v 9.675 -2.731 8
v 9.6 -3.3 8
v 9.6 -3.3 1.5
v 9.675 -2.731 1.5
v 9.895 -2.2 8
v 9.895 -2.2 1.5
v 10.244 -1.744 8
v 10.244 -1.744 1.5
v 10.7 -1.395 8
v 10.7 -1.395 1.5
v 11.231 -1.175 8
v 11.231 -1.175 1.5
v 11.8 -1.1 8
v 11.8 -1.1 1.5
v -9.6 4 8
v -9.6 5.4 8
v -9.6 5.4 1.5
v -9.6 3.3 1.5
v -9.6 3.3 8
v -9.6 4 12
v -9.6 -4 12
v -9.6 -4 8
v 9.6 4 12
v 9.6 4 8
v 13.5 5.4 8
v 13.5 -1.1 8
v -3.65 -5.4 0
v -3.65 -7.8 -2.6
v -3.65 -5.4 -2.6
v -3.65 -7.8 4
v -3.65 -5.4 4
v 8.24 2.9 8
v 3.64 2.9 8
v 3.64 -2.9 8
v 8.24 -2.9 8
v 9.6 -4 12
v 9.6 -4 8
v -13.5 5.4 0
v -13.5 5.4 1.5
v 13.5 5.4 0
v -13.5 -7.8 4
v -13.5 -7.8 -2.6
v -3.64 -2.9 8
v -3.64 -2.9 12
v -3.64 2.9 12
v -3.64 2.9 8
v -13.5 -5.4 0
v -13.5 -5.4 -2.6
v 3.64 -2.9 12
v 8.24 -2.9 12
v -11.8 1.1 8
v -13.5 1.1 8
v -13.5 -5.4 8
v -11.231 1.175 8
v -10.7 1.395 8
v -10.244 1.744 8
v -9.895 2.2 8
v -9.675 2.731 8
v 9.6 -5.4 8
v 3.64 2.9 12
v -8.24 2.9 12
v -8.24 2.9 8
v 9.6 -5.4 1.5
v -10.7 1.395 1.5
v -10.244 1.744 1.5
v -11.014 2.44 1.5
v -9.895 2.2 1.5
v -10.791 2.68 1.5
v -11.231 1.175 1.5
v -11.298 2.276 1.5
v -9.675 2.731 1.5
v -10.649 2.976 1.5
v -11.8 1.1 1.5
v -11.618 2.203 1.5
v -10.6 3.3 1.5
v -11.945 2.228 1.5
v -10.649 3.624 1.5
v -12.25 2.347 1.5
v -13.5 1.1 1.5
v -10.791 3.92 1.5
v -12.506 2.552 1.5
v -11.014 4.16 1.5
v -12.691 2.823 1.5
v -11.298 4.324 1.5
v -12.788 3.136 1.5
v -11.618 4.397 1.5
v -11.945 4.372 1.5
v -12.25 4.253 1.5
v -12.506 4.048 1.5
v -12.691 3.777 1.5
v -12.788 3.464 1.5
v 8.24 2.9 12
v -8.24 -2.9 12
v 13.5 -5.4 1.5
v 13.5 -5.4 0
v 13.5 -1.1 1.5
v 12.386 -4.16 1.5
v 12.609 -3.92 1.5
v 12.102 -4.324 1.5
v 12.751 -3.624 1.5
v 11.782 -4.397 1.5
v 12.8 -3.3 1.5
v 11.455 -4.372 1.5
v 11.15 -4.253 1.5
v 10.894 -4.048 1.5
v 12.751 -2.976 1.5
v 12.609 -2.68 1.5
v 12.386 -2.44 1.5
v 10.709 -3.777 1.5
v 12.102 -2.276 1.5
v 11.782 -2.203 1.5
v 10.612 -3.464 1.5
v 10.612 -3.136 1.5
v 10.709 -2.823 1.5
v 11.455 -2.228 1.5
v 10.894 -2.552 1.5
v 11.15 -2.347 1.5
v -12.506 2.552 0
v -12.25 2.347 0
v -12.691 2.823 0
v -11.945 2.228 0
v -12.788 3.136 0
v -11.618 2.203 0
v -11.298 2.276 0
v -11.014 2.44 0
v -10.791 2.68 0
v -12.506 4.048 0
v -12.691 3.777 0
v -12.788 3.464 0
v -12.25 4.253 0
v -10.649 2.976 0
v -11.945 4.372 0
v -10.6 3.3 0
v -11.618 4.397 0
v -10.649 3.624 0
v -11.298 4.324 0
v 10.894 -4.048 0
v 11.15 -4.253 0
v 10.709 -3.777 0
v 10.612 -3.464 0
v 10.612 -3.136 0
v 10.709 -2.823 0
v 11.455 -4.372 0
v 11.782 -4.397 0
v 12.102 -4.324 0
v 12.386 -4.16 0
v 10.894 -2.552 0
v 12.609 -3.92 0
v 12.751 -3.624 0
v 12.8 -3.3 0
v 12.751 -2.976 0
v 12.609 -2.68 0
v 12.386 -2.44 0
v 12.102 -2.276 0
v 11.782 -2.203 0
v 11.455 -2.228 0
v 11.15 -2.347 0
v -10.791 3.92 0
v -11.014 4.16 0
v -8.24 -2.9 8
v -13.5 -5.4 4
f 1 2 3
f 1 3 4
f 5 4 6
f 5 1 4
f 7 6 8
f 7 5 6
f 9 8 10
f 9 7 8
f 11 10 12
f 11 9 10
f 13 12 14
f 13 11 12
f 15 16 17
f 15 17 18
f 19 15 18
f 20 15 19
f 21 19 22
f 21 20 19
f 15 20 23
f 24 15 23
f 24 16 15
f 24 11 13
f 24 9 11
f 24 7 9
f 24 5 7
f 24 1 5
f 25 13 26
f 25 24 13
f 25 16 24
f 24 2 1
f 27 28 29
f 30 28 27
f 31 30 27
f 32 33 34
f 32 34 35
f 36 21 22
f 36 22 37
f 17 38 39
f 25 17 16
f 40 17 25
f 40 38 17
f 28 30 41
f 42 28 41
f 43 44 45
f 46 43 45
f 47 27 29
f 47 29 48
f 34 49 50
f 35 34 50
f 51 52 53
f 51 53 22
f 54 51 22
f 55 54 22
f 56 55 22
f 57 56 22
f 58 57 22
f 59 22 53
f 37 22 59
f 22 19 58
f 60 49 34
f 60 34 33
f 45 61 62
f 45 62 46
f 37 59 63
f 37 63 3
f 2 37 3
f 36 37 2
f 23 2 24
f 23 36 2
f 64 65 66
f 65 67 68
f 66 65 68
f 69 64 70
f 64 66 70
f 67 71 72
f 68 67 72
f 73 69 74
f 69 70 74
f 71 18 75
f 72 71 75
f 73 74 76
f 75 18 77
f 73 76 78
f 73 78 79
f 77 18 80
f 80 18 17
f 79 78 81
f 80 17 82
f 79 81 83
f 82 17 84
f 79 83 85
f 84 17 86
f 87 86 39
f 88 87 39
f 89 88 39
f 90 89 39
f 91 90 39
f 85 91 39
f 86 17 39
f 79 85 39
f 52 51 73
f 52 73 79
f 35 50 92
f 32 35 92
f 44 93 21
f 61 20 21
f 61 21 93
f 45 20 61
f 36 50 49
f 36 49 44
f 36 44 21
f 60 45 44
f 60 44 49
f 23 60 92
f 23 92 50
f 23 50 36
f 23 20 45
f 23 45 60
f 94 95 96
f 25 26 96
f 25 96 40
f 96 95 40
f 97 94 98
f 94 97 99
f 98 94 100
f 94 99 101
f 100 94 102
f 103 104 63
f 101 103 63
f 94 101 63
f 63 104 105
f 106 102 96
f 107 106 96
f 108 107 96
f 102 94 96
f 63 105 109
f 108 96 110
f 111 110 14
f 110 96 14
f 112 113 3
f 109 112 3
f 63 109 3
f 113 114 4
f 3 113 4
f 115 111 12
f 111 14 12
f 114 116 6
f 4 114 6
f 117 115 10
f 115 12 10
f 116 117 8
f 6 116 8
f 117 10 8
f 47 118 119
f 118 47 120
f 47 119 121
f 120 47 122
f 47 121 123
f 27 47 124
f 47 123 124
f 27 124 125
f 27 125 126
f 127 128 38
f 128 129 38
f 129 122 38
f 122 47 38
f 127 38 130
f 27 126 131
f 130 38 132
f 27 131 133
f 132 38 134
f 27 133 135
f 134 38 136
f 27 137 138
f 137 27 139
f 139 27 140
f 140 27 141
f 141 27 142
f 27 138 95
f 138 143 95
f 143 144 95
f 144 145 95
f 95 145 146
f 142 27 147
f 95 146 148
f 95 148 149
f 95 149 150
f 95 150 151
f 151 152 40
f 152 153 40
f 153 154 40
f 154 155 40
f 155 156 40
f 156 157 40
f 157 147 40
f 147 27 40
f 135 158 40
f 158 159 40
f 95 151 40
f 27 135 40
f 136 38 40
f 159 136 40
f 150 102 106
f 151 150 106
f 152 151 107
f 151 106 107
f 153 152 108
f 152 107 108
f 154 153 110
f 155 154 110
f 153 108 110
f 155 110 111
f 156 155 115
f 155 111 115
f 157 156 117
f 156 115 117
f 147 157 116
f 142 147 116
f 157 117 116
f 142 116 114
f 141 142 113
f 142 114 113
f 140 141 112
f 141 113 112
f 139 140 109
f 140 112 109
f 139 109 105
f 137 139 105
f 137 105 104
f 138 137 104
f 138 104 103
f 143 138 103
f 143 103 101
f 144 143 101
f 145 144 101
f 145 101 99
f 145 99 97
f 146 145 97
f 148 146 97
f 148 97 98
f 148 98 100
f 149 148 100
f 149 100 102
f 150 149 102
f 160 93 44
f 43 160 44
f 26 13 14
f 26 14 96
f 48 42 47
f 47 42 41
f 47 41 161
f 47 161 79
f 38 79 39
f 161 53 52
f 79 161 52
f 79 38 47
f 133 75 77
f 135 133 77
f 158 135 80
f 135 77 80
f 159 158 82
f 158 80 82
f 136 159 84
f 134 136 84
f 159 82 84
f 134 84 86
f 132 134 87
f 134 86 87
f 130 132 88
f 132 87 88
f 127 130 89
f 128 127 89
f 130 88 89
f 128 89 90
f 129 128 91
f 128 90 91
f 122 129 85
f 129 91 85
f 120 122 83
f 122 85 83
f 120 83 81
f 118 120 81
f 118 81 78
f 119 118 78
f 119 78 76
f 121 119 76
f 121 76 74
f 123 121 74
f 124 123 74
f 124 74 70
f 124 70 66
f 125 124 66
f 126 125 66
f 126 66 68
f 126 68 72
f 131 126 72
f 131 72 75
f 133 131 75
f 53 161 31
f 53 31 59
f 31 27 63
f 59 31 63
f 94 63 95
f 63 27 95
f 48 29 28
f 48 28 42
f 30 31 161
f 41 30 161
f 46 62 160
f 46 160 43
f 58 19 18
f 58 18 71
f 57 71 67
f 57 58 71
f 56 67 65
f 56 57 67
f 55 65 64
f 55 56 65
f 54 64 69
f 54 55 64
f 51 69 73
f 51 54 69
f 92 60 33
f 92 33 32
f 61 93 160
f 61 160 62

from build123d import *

# Parameters (mm, degrees)
SKETCH1_W                = 27
SKETCH1_H                = 10.8
BOSS_EXTRUDE1_DEPTH      = 12
SKETCH2_R                = 1.1
CUT_EXTRUDE1_DEPTH       = 19.852320812
CUT_EXTRUDE2_DEPTH       = 10.5
SKETCH4_W                = 27
SKETCH4_H                = 10.8
SKETCH4_W_2              = 19.2
SKETCH4_H_2              = 8
CUT_EXTRUDE3_DEPTH       = 4
SKETCH5_W                = 4.6
SKETCH5_H                = 5.8
CUT_EXTRUDE4_DEPTH       = 4
BOSS_EXTRUDE2_DEPTH      = 2.6
BOSS_EXTRUDE2_DEPTH_BACK = 4
SKETCH7_W                = 9.85
SKETCH7_H                = 2.4


with BuildPart() as part:
    # Sketch1 → Boss-Extrude1 (new body)
    with BuildSketch(Plane.XY):
        Rectangle(SKETCH1_W, SKETCH1_H)
    extrude(amount=BOSS_EXTRUDE1_DEPTH)

    # Sketch2 → Cut-Extrude1 (cut, through all)
    with BuildSketch(Plane.XY.offset(12)):
        with Locations((-11.7, 3.3)):
            Circle(SKETCH2_R)
        with Locations((11.7, -3.3)):
            Circle(SKETCH2_R)
    extrude(amount=-CUT_EXTRUDE1_DEPTH, mode=Mode.SUBTRACT)

    # Sketch3 → Cut-Extrude2 (cut)
    with BuildSketch(Plane.XY.offset(12)):
        with BuildLine():
            Line((9.6, -5.4), (9.6, -3.3))
            ThreePointArc((9.6, -3.3), (10.244365081, -1.744365081), (11.8, -1.1))
            Line((11.8, -1.1), (13.5, -1.1))
            Line((13.5, -1.1), (13.5, -5.4))
            Line((13.5, -5.4), (9.6, -5.4))
        make_face()
        with BuildLine():
            Line((-9.6, 5.4), (-9.6, 3.3))
            ThreePointArc((-9.6, 3.3), (-10.244365081, 1.744365081), (-11.8, 1.1))
            Line((-11.8, 1.1), (-13.5, 1.1))
            Line((-13.5, 1.1), (-13.5, 5.4))
            Line((-13.5, 5.4), (-9.6, 5.4))
        make_face()
    extrude(amount=-CUT_EXTRUDE2_DEPTH, mode=Mode.SUBTRACT)

    # Sketch4 → Cut-Extrude3 (cut)
    with BuildSketch(Plane.XY.offset(12)):
        Rectangle(SKETCH4_W, SKETCH4_H)
        Rectangle(SKETCH4_W_2, SKETCH4_H_2, mode=Mode.SUBTRACT)
    extrude(amount=-CUT_EXTRUDE3_DEPTH, mode=Mode.SUBTRACT)

    # Sketch5 → Cut-Extrude4 (cut)
    with BuildSketch(Plane.XY.offset(12)):
        with Locations((-5.94, 0)):
            Rectangle(SKETCH5_W, SKETCH5_H)
        with Locations((5.94, 0)):
            Rectangle(SKETCH5_W, SKETCH5_H)
    extrude(amount=-CUT_EXTRUDE4_DEPTH, mode=Mode.SUBTRACT)

    # Sketch7 → Boss-Extrude2 (add, two sides: drawn at the far end of the back side and taken through both)
    with BuildSketch(Plane(origin=(0, 0, 0), x_dir=(-1, 0, 0), z_dir=(0, 0, -1)).offset(-BOSS_EXTRUDE2_DEPTH_BACK)):
        with Locations((8.575, -6.6)):
            Rectangle(SKETCH7_W, SKETCH7_H)
    extrude(amount=BOSS_EXTRUDE2_DEPTH + BOSS_EXTRUDE2_DEPTH_BACK)


solid = part.part
